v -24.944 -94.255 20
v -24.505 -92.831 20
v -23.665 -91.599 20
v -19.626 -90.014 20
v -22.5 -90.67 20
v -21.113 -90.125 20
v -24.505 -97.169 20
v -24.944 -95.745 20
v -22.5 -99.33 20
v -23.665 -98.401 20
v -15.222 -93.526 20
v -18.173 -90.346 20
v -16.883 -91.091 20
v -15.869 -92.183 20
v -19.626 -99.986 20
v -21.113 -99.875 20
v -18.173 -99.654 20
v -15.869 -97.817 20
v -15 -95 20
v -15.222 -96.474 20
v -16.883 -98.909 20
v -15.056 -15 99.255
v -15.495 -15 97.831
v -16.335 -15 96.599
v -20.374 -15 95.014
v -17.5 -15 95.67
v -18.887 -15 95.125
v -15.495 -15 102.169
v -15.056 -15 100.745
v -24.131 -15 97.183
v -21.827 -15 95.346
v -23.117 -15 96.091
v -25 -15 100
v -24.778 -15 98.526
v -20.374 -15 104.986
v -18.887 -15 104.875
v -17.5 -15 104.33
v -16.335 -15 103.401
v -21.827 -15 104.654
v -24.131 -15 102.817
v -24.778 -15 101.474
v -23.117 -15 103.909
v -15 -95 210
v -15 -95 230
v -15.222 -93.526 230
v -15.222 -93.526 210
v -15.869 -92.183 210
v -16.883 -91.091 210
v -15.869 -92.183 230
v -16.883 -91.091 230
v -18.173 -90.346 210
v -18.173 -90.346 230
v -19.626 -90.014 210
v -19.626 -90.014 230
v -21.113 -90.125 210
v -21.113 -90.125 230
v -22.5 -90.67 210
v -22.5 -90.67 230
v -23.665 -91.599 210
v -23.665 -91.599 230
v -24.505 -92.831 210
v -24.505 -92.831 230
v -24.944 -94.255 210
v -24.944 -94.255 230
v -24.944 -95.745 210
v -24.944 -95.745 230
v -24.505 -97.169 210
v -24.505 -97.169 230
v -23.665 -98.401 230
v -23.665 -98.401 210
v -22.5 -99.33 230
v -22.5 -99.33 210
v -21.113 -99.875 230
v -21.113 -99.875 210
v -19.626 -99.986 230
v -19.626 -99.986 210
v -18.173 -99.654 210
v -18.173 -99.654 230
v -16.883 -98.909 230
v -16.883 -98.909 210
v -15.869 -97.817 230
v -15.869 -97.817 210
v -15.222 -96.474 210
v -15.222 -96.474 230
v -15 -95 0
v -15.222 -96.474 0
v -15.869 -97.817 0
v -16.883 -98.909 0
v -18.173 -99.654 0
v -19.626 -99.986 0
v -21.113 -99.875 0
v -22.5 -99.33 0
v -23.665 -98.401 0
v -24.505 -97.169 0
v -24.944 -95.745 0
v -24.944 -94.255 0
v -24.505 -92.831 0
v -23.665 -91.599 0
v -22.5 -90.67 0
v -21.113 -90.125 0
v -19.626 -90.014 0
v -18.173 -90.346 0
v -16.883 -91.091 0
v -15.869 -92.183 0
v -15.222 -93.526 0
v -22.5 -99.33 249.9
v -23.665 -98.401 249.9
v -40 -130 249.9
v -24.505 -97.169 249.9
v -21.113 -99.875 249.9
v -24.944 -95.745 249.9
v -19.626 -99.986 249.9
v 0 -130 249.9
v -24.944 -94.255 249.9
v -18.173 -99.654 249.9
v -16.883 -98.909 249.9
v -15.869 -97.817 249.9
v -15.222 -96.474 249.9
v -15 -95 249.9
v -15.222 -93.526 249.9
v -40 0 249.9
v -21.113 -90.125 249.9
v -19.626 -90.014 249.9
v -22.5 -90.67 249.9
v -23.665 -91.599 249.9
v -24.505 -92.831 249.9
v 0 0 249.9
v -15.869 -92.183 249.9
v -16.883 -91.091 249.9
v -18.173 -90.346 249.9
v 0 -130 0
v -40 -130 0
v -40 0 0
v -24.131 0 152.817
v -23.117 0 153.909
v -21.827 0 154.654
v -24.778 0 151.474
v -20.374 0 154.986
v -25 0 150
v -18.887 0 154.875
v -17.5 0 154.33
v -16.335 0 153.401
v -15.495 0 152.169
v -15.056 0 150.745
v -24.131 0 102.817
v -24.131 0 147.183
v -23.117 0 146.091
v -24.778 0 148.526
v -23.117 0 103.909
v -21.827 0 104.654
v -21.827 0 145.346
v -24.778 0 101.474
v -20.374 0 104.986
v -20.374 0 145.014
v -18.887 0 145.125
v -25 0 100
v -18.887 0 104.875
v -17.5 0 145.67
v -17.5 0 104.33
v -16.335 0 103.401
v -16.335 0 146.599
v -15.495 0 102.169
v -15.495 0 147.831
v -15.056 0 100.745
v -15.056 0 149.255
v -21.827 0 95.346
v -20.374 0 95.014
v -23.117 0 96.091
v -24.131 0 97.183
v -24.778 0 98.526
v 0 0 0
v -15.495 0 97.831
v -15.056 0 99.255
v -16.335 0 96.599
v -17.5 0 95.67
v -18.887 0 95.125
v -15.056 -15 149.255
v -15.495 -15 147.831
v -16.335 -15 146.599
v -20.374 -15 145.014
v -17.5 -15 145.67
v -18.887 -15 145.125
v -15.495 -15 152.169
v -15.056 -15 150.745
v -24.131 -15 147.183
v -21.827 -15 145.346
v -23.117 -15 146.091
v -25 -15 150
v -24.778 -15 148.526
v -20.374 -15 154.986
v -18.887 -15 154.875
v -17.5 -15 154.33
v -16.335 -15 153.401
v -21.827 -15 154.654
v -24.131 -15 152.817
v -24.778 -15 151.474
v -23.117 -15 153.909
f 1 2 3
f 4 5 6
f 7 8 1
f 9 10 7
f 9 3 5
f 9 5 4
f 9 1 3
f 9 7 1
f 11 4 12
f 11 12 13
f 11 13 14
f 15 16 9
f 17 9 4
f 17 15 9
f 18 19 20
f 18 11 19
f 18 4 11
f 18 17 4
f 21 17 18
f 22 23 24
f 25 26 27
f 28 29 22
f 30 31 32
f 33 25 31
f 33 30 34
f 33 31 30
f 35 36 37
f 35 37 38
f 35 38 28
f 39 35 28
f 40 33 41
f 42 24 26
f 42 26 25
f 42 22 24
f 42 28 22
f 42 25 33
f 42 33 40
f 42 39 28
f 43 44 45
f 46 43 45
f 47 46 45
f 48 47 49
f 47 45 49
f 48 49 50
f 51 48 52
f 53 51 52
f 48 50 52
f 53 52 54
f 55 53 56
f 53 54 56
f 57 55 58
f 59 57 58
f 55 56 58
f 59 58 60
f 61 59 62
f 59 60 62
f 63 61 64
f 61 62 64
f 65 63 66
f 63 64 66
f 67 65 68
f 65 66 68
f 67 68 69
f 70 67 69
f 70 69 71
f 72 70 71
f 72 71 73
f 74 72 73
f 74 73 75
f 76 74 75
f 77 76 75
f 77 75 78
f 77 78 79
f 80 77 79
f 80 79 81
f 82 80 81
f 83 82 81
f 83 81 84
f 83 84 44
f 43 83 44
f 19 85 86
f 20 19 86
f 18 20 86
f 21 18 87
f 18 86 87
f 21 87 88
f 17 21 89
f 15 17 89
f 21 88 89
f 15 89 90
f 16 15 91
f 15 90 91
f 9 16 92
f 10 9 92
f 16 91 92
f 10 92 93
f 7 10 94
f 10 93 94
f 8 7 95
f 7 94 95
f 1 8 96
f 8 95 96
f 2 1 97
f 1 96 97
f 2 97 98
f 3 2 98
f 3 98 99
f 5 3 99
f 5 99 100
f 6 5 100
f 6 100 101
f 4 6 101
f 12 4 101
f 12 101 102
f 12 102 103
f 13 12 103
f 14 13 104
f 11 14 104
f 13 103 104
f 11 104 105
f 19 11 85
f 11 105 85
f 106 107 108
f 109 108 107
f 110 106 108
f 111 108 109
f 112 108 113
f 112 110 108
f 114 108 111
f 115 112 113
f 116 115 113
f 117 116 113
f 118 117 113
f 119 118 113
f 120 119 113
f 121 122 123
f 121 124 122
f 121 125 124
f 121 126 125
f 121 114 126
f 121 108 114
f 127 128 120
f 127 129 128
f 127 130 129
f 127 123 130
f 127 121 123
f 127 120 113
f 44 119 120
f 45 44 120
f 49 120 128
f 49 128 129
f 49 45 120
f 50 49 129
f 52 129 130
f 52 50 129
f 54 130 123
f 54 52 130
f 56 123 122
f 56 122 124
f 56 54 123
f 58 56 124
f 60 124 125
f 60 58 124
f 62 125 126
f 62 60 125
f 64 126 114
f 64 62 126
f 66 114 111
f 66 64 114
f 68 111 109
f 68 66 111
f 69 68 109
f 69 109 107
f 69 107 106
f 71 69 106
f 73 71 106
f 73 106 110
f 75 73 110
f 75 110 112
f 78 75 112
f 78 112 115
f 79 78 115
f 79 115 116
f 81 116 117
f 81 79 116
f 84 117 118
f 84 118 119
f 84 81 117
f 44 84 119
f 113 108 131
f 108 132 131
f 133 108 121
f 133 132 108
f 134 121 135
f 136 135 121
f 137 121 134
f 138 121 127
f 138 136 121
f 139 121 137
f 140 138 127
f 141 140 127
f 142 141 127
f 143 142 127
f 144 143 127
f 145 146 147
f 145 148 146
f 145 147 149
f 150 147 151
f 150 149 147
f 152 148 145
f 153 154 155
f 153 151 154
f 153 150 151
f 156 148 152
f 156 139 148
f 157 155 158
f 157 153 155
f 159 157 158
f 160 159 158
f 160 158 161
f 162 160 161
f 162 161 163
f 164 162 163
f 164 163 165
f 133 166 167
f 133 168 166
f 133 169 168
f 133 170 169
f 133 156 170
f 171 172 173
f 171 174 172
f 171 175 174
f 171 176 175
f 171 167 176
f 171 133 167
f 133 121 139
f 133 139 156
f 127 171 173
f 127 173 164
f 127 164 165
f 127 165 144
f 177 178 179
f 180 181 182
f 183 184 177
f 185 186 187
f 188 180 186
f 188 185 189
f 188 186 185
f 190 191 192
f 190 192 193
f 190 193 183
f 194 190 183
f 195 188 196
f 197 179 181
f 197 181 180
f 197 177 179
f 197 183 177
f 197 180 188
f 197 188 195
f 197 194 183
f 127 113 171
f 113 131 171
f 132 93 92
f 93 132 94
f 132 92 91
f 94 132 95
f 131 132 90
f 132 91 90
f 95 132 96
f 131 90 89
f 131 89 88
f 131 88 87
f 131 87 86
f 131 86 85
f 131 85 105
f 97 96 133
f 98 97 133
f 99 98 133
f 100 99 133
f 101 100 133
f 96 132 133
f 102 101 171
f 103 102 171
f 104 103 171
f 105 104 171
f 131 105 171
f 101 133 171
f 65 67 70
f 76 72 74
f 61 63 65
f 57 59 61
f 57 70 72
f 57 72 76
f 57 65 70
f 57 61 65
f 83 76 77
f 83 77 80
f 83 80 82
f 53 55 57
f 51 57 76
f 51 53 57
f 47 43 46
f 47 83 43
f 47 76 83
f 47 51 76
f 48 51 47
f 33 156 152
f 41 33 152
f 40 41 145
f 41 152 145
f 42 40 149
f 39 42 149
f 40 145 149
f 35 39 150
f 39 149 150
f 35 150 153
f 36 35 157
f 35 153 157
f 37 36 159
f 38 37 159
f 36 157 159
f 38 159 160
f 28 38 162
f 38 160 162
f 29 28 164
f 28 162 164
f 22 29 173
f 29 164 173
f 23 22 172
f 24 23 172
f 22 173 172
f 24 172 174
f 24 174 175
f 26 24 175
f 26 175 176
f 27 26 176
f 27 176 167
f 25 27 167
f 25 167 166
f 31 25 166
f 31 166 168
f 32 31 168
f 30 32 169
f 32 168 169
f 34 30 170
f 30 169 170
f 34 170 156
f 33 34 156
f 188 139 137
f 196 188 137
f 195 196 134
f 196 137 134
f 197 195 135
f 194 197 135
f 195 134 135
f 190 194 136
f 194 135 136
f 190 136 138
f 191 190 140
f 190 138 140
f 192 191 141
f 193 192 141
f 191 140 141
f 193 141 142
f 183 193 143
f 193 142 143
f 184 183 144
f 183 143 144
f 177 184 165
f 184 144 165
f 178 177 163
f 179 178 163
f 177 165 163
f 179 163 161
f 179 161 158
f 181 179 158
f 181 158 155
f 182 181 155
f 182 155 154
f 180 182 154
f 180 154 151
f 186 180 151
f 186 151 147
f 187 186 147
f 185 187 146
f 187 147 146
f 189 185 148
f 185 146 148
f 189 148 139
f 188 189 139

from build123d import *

# Parameters (mm, degrees)
F0_W      = 40
F0_H      = 130
F1_DEPTH  = 250
F2_R      = 5
F3_DEPTH  = 15
F4_W      = 40
F4_H      = 130
F6_DEPTH  = 20
F5_R      = 5
F7_DEPTH  = 40
F8_R      = 5
F9_DEPTH  = 20
F10_DEPTH = 19.9


with BuildPart() as f1:
    # F0 (on Top) → F1 (new body)
    with BuildSketch(Plane.XY):
        with Locations((-20, -65)):
            Rectangle(F0_W, F0_H)
    extrude(amount=F1_DEPTH)

    # F2 (on face) → F3 (cut)
    with BuildSketch(Plane(origin=(0, 0, 0), x_dir=(-1, 0, 0), z_dir=(0, 1, 0))):
        with Locations((20, 150)):
            Circle(F2_R)
        with Locations((20, 100)):
            Circle(F2_R)
    extrude(amount=-F3_DEPTH, mode=Mode.SUBTRACT)

    # F4 (on face) → F6 (cut)
    with BuildSketch(Plane.XY.offset(250)):
        with Locations((-20, -65)):
            Rectangle(F4_W, F4_H)
    extrude(amount=-F6_DEPTH, mode=Mode.SUBTRACT)

    # F5 (on face) → F7 (cut)
    with BuildSketch(Plane.XY.offset(250)):
        with Locations((-20, -95)):
            Circle(F5_R)
    extrude(amount=-F7_DEPTH, mode=Mode.SUBTRACT)

    # F8 (on face) → F9 (cut)
    with BuildSketch(Plane(origin=(0, 0, 0), x_dir=(1, 0, 0), z_dir=(0, 0, -1))):
        with Locations((-20, 95)):
            Circle(F8_R)
    extrude(amount=-F9_DEPTH, mode=Mode.SUBTRACT)

    # F10 (add): a face of the model
    f10_faces = [f1.faces().sort_by_distance(p)[0] for p in [
        (-20, -64.53993697, 230),
    ]]
    extrude(f10_faces, amount=F10_DEPTH)


solid = f1.part
